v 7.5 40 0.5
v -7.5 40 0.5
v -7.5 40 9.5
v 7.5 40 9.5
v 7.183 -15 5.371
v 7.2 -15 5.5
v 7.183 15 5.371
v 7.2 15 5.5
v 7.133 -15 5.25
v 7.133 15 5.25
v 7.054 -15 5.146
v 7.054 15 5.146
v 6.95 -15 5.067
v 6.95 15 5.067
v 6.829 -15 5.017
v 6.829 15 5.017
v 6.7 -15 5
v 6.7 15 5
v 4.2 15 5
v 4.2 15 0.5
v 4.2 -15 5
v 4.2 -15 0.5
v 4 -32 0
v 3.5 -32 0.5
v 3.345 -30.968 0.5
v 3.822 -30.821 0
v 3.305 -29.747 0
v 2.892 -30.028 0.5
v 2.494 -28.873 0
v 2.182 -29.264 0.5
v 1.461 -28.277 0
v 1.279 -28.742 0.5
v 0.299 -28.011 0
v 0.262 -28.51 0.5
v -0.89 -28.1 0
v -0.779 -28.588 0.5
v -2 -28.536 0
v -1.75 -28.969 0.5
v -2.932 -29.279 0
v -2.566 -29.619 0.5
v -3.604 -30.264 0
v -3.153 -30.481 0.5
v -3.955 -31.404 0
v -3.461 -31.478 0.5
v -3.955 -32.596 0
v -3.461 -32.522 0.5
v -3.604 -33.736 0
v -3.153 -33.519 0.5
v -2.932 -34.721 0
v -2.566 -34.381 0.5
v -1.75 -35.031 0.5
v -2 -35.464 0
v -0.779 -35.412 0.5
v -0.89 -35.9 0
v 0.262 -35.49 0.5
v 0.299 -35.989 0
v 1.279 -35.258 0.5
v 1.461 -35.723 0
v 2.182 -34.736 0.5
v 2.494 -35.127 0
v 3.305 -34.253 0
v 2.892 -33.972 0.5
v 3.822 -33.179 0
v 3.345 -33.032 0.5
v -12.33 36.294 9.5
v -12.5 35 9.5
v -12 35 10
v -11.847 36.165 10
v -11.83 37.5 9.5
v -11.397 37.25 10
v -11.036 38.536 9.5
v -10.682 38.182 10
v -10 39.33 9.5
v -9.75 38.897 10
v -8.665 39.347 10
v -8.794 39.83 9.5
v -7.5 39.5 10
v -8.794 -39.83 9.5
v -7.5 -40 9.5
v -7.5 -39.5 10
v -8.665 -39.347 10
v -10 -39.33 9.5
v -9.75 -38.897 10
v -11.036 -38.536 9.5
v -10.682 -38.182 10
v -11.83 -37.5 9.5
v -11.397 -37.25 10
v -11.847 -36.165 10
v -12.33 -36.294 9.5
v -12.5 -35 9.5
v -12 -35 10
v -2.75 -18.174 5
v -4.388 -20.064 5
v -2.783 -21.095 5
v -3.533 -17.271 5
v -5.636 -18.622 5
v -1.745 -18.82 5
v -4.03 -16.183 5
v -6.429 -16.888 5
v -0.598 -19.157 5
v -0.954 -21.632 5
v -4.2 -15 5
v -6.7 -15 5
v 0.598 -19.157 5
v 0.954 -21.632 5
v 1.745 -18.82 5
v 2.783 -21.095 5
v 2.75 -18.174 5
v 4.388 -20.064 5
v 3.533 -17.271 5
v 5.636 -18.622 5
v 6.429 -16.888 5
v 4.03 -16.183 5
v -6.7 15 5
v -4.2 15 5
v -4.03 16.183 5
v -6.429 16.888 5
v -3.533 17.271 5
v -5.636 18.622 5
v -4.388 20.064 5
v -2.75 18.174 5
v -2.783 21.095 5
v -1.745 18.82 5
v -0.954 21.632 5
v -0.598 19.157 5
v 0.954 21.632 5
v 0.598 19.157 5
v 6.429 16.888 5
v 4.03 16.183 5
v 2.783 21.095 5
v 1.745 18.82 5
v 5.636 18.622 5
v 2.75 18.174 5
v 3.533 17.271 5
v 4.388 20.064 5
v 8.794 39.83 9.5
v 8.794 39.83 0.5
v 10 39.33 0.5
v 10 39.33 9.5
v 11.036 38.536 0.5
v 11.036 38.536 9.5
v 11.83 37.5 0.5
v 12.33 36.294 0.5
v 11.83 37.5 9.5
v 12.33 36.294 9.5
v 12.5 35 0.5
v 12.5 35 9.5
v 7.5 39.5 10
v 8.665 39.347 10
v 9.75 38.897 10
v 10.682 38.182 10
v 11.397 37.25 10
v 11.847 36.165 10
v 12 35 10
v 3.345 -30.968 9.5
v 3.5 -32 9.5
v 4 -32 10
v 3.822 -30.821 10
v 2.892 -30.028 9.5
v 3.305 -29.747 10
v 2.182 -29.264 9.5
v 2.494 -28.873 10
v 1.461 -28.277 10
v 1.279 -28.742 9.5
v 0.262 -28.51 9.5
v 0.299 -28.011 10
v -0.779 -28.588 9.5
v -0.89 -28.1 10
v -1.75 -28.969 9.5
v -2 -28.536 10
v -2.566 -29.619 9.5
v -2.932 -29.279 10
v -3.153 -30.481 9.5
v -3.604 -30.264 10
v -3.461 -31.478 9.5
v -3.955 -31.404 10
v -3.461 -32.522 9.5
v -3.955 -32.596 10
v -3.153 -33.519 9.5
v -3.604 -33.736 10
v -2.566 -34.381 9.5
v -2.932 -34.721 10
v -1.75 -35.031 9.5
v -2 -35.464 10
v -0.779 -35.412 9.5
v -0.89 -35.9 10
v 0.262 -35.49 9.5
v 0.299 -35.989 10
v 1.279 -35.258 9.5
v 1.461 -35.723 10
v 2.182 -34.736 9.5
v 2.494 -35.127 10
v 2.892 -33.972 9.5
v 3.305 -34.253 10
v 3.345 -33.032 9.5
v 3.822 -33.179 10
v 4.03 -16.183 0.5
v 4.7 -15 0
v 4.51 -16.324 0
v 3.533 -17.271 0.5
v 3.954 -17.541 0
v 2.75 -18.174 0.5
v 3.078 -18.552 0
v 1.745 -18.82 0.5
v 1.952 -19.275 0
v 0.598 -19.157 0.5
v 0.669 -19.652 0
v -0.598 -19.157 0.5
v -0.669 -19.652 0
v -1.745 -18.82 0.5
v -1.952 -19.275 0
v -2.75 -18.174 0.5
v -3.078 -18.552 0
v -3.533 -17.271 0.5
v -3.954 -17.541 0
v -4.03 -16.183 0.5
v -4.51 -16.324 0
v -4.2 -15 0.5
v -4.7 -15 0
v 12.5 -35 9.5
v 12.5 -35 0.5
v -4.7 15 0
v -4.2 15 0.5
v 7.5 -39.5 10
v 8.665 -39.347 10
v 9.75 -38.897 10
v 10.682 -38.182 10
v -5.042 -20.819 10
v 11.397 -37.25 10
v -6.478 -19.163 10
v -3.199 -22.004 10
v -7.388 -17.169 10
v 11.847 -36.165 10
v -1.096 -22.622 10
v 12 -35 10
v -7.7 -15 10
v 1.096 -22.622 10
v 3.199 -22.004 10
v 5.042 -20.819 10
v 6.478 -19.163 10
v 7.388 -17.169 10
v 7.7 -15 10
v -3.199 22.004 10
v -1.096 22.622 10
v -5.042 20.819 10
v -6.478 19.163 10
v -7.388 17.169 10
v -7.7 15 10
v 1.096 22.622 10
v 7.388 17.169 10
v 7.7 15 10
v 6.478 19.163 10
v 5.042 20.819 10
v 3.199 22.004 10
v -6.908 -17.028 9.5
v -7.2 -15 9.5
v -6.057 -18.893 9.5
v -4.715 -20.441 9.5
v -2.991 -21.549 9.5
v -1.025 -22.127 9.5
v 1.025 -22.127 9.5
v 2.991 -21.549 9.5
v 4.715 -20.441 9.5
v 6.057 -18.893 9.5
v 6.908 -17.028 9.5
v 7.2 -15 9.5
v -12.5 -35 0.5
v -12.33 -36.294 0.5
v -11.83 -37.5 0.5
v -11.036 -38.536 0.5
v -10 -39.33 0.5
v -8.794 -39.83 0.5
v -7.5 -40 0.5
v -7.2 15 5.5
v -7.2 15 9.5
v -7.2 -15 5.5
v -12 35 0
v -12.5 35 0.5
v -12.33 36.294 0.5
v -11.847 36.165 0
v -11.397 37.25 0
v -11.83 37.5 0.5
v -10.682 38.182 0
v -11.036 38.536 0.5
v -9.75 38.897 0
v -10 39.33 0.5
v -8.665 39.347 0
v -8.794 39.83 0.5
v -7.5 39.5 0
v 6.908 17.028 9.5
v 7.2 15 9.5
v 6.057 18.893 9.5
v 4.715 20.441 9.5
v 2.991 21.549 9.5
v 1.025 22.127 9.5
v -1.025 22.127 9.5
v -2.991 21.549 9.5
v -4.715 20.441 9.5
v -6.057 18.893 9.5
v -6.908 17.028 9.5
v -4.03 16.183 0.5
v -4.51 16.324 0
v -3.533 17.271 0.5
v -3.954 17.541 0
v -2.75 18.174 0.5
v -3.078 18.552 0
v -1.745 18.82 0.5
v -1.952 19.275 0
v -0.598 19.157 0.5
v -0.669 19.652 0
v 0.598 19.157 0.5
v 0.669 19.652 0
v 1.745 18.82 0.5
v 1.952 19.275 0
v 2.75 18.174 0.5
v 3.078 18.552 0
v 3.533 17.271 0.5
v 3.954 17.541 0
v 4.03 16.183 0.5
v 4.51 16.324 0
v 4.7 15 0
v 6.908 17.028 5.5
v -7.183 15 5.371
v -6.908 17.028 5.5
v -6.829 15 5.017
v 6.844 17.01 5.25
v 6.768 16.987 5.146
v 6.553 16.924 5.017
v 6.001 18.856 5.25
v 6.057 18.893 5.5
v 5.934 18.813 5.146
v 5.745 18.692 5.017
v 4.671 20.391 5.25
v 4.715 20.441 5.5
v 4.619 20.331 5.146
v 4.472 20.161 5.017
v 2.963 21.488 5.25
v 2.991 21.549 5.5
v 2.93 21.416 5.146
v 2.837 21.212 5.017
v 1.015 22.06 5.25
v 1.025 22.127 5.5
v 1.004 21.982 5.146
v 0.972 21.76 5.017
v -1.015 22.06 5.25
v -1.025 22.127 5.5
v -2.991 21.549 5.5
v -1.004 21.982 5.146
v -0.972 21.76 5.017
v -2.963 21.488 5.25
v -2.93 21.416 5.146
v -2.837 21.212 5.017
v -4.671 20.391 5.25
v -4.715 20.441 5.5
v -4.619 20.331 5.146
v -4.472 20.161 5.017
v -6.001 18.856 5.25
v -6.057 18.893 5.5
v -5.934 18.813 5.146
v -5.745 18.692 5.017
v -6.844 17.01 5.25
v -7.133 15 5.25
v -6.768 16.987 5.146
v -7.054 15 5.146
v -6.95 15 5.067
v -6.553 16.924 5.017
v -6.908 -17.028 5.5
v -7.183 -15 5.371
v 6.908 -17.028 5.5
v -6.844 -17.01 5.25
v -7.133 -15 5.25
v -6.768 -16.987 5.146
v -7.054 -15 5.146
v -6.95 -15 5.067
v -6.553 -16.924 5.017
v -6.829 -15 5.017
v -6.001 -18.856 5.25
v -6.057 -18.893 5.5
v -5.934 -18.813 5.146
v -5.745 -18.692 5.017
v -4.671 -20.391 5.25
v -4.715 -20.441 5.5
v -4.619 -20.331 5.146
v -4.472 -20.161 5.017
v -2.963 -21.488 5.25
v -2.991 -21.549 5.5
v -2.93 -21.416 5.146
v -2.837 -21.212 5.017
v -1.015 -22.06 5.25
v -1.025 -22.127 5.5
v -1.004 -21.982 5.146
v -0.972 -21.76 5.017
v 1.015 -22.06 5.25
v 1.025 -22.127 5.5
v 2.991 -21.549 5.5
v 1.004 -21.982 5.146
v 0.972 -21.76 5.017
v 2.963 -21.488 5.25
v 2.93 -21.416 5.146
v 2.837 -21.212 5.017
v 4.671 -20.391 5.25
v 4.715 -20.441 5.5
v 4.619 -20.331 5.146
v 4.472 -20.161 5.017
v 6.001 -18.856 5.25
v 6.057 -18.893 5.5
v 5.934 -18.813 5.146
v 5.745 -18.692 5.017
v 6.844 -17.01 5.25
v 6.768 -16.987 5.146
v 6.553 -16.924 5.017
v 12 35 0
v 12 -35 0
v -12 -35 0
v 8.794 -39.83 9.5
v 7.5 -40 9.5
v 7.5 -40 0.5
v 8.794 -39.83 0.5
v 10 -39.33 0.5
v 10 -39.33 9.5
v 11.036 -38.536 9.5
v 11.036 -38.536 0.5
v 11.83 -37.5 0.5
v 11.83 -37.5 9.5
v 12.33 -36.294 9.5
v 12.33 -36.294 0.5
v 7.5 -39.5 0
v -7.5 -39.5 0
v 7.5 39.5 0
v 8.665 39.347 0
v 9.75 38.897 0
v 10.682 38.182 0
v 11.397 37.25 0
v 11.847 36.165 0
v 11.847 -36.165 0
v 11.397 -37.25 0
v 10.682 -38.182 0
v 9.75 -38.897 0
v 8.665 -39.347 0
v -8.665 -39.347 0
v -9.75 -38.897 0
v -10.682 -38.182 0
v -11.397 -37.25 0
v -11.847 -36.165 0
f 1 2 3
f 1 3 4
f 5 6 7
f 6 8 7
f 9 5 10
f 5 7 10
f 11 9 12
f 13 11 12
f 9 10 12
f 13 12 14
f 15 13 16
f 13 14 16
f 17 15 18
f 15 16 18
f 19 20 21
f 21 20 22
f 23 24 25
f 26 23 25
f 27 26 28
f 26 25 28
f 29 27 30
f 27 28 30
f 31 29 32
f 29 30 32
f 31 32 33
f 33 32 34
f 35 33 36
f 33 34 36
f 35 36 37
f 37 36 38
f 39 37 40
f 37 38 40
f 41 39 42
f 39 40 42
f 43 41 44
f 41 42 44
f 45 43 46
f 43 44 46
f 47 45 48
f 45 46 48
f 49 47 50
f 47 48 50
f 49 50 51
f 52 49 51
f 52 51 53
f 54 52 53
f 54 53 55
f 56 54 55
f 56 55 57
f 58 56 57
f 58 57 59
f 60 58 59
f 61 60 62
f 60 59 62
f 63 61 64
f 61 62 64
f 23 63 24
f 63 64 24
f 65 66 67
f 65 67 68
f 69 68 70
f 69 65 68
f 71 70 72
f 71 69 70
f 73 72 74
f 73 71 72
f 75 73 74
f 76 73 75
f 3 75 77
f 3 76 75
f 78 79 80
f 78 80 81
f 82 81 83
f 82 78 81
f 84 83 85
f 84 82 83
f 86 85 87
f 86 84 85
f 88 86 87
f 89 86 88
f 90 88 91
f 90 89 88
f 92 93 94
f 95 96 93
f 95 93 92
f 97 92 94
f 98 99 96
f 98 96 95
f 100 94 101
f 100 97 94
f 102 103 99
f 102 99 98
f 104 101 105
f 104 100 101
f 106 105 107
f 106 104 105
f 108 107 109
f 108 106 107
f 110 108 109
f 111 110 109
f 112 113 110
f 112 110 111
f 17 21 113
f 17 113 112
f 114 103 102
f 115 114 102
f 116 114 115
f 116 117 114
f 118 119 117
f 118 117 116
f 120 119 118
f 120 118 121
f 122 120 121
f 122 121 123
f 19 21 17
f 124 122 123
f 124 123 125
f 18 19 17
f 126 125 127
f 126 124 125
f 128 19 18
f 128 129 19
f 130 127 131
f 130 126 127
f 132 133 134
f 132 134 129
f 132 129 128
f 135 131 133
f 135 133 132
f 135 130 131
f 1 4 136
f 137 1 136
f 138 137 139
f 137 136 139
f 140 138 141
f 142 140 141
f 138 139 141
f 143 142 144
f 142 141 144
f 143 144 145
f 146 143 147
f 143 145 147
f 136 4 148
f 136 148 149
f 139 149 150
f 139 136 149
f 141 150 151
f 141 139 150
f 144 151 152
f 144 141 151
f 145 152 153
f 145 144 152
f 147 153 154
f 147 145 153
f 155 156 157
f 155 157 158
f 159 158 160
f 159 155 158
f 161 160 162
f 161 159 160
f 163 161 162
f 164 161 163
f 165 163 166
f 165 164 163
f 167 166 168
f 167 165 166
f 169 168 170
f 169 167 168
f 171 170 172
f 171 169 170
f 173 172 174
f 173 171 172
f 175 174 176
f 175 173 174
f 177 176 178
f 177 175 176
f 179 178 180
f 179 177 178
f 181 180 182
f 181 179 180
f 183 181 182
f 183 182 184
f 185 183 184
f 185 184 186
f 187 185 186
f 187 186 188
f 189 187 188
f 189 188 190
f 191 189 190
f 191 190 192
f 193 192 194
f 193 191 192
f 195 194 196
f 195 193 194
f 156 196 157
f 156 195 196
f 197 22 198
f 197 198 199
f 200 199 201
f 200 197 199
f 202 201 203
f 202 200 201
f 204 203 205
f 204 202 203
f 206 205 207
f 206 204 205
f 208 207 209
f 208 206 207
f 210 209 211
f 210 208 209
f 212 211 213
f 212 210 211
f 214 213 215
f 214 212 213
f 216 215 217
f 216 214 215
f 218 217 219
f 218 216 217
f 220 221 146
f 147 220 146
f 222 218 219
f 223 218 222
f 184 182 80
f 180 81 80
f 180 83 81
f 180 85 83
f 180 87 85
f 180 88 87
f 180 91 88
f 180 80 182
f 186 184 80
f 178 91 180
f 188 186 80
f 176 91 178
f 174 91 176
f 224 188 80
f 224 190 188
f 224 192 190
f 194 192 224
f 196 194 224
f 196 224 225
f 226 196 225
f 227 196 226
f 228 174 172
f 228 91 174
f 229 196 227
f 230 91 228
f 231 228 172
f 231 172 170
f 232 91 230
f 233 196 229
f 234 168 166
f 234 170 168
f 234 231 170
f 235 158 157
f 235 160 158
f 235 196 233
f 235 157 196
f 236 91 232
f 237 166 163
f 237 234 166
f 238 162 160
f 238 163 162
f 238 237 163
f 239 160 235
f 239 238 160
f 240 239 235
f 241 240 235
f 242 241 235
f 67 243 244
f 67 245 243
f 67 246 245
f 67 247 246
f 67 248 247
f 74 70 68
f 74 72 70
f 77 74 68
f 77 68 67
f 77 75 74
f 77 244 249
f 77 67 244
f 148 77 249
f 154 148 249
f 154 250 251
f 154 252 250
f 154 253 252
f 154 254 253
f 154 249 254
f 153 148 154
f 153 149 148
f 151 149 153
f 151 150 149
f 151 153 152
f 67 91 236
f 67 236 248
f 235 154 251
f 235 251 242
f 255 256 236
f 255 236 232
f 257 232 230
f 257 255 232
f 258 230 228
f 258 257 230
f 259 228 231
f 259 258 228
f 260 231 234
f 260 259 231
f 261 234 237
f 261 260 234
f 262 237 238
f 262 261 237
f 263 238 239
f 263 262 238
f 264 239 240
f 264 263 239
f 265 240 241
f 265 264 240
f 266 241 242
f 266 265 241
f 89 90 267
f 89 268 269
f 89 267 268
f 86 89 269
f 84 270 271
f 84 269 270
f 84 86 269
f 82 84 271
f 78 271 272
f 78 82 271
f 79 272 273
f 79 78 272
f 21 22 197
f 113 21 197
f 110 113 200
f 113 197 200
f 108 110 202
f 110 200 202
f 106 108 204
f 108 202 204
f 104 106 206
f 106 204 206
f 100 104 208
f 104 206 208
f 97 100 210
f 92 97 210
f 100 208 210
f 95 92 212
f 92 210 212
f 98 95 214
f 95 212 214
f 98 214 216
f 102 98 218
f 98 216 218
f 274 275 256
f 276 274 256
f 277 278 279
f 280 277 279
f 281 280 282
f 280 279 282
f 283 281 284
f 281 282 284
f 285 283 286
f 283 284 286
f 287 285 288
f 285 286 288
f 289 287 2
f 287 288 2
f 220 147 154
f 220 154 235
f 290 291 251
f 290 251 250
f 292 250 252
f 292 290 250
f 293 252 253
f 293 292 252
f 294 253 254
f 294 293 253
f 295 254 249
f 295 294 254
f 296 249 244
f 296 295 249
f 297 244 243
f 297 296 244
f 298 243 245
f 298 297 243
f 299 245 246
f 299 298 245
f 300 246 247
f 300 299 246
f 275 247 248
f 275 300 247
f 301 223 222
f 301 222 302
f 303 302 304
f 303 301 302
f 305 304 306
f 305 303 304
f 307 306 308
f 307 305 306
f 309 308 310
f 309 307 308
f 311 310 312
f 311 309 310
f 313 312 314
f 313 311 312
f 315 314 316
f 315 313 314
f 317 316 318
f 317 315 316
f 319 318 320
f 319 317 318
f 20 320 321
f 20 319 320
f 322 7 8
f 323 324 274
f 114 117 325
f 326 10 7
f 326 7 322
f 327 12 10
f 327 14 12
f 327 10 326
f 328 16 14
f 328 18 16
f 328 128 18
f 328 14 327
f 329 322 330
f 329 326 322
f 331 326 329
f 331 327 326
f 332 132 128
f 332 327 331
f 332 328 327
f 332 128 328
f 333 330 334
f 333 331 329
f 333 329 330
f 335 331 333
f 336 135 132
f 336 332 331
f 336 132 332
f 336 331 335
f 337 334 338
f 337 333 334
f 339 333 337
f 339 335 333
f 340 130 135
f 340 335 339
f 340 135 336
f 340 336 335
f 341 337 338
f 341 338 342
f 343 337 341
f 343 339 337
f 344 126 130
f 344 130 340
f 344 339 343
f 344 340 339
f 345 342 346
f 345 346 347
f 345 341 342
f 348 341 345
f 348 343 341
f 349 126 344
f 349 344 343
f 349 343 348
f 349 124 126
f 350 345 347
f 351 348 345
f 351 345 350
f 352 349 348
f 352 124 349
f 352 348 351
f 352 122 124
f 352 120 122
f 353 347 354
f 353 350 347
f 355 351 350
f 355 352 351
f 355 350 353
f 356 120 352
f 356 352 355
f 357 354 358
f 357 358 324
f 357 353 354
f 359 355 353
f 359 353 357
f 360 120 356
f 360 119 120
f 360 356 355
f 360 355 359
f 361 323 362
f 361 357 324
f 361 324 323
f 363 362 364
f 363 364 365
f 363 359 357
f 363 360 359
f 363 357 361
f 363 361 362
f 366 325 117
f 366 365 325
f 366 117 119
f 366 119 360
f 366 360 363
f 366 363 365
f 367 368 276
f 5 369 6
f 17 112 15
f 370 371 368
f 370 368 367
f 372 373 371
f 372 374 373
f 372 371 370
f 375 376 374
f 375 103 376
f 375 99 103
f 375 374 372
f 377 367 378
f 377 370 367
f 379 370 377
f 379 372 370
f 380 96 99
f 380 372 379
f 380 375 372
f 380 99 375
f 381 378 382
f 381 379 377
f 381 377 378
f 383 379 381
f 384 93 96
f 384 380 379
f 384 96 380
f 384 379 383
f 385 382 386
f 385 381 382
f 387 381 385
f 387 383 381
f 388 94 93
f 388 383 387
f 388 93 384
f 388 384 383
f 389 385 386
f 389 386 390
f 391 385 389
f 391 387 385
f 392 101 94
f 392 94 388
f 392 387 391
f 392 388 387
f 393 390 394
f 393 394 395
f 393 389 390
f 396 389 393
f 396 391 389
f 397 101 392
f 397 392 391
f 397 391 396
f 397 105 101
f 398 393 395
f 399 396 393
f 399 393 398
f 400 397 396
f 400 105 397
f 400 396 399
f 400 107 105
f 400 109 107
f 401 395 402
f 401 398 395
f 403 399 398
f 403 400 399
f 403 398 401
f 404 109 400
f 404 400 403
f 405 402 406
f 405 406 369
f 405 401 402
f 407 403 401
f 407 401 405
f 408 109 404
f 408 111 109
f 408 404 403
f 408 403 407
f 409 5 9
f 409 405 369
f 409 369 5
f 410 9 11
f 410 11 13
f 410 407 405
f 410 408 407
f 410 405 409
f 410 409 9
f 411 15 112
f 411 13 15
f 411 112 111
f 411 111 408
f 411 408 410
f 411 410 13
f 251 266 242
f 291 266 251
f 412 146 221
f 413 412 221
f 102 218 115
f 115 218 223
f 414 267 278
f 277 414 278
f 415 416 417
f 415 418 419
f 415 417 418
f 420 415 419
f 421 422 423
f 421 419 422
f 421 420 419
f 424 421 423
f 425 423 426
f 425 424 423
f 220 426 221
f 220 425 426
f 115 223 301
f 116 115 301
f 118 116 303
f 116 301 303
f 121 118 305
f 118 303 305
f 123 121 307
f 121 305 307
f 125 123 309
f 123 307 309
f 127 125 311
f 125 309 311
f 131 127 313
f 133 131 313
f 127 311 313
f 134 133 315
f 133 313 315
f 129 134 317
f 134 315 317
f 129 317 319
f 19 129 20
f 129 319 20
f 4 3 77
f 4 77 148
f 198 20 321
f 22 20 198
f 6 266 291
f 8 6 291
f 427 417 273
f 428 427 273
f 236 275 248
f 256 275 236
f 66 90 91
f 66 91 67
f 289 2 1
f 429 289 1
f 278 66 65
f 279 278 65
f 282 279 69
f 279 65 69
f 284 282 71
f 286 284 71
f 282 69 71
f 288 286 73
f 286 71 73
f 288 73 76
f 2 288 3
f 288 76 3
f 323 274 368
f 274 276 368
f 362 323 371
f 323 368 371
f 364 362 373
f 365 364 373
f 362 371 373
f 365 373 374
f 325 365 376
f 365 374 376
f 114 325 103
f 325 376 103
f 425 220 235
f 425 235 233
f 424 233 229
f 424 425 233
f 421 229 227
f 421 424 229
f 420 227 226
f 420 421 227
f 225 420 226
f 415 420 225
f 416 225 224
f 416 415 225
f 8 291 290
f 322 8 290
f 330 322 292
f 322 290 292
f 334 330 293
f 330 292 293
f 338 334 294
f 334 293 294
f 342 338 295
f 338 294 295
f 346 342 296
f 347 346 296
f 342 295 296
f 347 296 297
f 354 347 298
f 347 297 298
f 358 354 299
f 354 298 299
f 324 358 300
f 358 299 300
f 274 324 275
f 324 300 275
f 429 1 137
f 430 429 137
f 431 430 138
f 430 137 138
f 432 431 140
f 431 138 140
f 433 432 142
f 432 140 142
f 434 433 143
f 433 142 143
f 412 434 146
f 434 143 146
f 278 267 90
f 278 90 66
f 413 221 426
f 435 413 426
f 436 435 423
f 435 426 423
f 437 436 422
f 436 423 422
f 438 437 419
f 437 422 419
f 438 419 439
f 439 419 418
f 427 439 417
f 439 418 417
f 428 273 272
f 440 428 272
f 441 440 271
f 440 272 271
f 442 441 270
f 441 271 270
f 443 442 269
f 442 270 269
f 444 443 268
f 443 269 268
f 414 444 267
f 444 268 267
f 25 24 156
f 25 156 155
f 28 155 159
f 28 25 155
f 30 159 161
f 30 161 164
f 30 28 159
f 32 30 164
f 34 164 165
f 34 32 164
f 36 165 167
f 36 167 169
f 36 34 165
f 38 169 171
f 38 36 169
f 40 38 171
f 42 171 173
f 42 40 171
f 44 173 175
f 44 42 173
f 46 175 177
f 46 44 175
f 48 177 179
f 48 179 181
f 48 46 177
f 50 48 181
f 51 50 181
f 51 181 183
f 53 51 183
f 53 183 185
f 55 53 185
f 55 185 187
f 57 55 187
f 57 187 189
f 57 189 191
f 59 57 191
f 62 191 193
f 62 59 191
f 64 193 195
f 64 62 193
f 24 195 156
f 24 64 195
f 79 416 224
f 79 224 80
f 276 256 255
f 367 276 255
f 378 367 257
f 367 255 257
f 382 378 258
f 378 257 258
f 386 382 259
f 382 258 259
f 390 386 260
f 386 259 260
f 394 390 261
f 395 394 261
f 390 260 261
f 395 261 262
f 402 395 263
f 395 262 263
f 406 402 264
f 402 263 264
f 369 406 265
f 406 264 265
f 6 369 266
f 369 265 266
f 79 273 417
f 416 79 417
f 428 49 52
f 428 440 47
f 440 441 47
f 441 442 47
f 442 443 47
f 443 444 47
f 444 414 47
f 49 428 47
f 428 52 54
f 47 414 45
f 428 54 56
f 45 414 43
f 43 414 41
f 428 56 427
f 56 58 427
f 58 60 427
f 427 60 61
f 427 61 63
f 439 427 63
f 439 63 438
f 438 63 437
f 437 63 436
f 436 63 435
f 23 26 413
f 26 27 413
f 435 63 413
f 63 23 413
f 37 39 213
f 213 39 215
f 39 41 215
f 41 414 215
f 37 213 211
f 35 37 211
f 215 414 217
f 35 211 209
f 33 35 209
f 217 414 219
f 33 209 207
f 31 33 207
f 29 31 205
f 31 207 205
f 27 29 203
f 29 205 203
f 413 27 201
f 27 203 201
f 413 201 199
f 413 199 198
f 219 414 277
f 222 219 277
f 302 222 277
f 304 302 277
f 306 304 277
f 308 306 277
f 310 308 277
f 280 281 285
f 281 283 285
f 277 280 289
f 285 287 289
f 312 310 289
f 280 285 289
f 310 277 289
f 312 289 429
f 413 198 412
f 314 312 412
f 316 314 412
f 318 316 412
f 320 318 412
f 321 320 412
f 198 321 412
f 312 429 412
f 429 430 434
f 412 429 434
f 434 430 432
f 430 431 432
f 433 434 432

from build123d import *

# Parameters (mm, degrees)
F0_W     = 25
F0_H     = 80
F0_R     = 3.5
F1_DEPTH = 10
F3_DEPTH = 5
F4_R     = 5
F5_SIZE  = 0.5
F6_R     = 0.5


with BuildPart() as f1:
    # F0 (on Top) → F1 (new body)
    with BuildSketch(Plane.XY):
        Rectangle(F0_W, F0_H)
        with Locations((0, -32)):
            Circle(F0_R, mode=Mode.SUBTRACT)
        with BuildLine():
            ThreePointArc((-4.2, 15), (0, 19.2), (4.2, 15))
            Line((4.2, 15), (4.2, -15))
            ThreePointArc((4.2, -15), (0, -19.2), (-4.2, -15))
            Line((-4.2, -15), (-4.2, 15))
        make_face(mode=Mode.SUBTRACT)
    extrude(amount=F1_DEPTH)

    # F2 (on face) → F3 (cut)
    with BuildSketch(Plane.XY.offset(10)):
        with BuildLine():
            Line((7.2, -15), (7.2, 15))
            ThreePointArc((7.2, 15), (0, 22.2), (-7.2, 15))
            Line((-7.2, 15), (-7.2, -15))
            ThreePointArc((-7.2, -15), (0, -22.2), (7.2, -15))
        make_face()
        with BuildLine():
            ThreePointArc((-4.2, 15), (0, 19.2), (4.2, 15))
            Line((4.2, 15), (4.2, -15))
            ThreePointArc((4.2, -15), (0, -19.2), (-4.2, -15))
            Line((-4.2, -15), (-4.2, 15))
        make_face(mode=Mode.SUBTRACT)
    extrude(amount=-F3_DEPTH, mode=Mode.SUBTRACT)

    # F4
    f4_edges = [f1.edges().sort_by_distance(p)[0] for p in [
        (12.5, 40, 5),
        (-12.5, -40, 5),
        (12.5, -40, 5),
        (-12.5, 40, 5),
    ]]
    fillet(f4_edges, radius=F4_R)

    # F5
    f5_edges = [f1.edges().sort_by_distance(p)[0] for p in [
        (0, 40, 10),
        (11.035534, 38.535534, 10),
        (-11.035534, 38.535534, 10),
        (12.5, 0, 10),
        (-12.5, 0, 10),
        (11.035534, -38.535534, 10),
        (-11.035534, -38.535534, 10),
        (0, -40, 10),
        (-3.5, -32, 10),
        (0, -22.2, 10),
        (7.2, 0, 10),
        (0, 22.2, 10),
        (-7.2, 0, 10),
        (0, 40, 0),
        (11.035534, 38.535534, 0),
        (-11.035534, 38.535534, 0),
        (12.5, 0, 0),
        (-12.5, 0, 0),
        (11.035534, -38.535534, 0),
        (-11.035534, -38.535534, 0),
        (0, -40, 0),
        (-3.5, -32, 0),
        (0, -19.2, 0),
        (-4.2, 0, 0),
        (0, 19.2, 0),
        (4.2, 0, 0),
    ]]
    chamfer(f5_edges, length=F5_SIZE)

    # F6
    f6_edges = [f1.edges().sort_by_distance(p)[0] for p in [
        (0, 22.2, 5),
    ]]
    fillet(f6_edges, radius=F6_R)


solid = f1.part
